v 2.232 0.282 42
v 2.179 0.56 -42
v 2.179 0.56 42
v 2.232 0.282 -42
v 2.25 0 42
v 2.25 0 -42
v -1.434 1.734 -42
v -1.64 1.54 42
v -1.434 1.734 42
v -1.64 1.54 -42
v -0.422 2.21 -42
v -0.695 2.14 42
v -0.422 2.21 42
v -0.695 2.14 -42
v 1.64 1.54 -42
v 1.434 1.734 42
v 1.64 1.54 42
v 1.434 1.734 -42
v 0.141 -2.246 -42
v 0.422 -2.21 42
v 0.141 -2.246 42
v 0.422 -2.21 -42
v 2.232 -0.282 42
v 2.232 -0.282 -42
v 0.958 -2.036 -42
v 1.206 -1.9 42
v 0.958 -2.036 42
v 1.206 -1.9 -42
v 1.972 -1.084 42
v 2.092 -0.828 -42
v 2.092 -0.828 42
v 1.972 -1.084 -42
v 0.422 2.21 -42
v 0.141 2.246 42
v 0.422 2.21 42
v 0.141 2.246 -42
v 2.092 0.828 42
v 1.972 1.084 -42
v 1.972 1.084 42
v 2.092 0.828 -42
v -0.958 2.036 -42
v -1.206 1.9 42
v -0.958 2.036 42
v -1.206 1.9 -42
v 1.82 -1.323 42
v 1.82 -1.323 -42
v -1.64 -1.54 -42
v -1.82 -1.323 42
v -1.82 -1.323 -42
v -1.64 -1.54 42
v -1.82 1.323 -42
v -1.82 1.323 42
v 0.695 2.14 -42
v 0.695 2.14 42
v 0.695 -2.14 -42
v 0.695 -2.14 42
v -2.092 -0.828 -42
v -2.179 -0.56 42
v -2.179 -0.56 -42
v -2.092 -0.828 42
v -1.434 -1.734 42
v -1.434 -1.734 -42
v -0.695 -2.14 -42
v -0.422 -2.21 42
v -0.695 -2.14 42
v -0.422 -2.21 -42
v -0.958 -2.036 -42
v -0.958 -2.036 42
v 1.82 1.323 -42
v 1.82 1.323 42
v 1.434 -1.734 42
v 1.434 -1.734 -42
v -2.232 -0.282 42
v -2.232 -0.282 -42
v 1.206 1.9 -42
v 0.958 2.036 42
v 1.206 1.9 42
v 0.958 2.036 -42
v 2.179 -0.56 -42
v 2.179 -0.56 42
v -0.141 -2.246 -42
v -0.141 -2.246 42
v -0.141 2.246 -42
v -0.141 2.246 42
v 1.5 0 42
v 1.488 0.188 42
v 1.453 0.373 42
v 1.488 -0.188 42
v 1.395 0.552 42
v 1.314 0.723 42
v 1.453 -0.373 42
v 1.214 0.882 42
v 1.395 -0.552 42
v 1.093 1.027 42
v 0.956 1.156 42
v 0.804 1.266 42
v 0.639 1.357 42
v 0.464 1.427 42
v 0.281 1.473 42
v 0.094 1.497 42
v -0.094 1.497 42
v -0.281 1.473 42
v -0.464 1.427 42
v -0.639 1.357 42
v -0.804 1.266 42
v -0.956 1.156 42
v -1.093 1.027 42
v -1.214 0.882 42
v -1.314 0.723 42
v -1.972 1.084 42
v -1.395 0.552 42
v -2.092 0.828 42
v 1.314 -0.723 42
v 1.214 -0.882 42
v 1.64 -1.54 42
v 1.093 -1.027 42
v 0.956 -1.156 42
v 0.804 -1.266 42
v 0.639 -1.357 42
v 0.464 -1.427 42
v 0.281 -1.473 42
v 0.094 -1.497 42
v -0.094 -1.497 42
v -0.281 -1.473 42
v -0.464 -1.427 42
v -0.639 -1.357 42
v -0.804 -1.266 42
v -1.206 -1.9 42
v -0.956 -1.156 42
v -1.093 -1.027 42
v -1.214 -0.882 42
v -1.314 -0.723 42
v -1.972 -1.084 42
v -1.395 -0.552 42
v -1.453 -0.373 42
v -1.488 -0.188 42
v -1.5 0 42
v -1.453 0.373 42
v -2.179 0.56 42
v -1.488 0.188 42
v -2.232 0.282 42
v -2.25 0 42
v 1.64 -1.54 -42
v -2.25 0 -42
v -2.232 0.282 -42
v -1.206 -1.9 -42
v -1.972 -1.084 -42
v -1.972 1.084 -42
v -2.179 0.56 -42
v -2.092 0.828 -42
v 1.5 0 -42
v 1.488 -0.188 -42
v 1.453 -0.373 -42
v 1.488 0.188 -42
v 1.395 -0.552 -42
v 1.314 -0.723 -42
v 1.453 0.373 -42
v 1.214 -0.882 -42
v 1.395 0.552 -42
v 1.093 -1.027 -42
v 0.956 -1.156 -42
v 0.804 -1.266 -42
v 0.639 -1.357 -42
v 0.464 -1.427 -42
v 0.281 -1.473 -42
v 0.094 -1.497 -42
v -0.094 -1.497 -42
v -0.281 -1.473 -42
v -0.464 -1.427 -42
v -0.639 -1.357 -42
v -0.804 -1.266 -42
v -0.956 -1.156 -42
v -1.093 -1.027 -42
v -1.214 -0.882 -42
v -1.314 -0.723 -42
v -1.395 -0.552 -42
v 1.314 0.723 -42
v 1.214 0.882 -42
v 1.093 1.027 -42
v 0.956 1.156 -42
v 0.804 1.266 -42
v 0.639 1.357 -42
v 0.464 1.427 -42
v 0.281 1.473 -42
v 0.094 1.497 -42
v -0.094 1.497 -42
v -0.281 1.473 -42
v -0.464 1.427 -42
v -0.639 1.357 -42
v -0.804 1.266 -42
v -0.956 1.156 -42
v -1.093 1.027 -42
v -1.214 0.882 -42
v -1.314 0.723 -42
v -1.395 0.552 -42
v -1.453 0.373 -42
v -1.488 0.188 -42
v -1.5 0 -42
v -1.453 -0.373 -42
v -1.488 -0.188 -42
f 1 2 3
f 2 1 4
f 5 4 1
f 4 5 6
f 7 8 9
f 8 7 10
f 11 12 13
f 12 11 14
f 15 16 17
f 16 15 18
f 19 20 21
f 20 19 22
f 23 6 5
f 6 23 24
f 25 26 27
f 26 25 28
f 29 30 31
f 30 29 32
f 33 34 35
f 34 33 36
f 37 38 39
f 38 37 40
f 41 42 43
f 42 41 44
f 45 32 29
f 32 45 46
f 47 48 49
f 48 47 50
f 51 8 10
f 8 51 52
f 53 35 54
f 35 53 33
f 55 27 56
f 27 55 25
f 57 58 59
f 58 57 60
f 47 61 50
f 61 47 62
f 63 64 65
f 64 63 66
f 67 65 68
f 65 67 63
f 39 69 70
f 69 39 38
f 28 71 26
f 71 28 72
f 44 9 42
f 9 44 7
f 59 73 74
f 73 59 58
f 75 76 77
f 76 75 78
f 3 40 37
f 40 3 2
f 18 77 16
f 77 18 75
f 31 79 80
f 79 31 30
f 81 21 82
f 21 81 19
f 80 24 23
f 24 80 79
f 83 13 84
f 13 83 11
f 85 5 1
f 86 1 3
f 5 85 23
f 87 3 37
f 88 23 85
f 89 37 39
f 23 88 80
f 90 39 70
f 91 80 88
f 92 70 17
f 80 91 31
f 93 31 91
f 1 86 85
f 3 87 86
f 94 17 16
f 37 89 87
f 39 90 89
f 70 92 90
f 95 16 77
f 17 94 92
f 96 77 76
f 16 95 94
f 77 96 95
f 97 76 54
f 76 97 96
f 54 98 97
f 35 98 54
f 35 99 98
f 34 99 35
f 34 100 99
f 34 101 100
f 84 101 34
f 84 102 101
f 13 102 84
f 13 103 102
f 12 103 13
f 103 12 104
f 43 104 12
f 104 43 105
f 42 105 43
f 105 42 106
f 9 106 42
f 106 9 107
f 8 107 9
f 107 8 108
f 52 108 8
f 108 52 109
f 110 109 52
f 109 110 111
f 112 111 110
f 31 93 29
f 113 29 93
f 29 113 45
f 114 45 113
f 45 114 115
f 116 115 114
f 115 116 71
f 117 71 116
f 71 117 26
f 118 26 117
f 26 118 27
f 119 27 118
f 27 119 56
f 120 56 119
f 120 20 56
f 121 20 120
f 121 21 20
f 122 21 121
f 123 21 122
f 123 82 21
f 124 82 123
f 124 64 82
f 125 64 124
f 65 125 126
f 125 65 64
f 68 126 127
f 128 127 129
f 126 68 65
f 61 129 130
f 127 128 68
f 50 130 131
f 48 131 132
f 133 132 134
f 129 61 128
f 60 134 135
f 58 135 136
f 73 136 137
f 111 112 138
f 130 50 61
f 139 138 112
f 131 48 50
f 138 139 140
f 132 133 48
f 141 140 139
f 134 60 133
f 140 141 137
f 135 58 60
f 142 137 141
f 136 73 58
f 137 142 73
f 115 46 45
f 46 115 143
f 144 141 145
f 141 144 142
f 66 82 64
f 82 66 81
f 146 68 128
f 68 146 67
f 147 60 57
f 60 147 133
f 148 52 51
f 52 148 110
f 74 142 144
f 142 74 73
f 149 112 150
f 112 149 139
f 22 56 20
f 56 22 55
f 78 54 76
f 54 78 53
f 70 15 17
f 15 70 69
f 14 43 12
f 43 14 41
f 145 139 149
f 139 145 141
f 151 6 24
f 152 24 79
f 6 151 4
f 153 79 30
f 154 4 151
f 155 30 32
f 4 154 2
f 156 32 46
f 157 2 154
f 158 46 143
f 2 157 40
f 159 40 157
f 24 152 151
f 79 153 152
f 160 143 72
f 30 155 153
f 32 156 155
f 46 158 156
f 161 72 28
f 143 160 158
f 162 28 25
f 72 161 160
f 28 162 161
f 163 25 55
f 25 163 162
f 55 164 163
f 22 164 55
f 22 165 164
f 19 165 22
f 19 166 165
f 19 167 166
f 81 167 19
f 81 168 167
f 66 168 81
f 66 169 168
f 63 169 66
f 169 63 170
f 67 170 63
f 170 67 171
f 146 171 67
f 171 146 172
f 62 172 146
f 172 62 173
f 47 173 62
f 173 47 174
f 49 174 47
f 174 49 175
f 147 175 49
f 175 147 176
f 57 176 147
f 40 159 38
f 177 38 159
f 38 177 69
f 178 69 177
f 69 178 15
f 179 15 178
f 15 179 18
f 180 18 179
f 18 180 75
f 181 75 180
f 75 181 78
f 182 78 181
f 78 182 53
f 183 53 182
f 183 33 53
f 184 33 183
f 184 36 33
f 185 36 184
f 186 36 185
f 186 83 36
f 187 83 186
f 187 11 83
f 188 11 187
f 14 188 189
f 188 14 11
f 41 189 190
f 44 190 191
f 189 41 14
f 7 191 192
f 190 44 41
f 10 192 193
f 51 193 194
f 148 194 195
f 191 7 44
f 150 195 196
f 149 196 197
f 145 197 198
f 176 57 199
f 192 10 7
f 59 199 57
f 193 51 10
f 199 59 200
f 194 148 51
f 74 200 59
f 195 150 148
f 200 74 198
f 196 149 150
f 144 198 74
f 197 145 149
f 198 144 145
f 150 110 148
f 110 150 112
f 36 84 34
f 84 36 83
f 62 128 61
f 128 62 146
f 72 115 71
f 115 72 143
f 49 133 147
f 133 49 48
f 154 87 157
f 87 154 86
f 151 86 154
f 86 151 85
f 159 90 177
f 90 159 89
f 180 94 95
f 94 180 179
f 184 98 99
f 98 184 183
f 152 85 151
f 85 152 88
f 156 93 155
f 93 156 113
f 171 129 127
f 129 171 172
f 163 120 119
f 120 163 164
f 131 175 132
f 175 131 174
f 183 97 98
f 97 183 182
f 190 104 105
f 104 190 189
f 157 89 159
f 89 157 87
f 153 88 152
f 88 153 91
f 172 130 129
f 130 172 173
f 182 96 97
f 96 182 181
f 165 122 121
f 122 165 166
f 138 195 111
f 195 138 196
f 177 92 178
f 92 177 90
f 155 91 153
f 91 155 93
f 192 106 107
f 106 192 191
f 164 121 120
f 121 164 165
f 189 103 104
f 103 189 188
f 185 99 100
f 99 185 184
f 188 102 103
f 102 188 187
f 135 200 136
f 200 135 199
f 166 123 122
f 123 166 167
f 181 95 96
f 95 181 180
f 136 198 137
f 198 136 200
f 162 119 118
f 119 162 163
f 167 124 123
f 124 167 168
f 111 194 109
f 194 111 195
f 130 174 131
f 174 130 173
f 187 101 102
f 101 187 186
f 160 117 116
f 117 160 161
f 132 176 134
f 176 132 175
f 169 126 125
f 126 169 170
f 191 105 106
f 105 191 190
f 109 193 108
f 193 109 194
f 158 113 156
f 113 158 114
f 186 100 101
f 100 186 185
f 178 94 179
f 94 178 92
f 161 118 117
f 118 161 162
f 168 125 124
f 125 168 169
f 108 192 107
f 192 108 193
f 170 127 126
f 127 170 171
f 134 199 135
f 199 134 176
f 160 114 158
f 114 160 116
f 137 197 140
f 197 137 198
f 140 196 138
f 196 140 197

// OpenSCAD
$fn = 50;


difference() {
	union() {
		translate(v = [0, 0, -42.0000000000]) {
			cylinder(h = 84, r = 2.2500000000);
		}
	}
	union() {
		translate(v = [0, 0, -100.0000000000]) {
			cylinder(h = 200, r = 1.5000000000);
		}
	}
}
